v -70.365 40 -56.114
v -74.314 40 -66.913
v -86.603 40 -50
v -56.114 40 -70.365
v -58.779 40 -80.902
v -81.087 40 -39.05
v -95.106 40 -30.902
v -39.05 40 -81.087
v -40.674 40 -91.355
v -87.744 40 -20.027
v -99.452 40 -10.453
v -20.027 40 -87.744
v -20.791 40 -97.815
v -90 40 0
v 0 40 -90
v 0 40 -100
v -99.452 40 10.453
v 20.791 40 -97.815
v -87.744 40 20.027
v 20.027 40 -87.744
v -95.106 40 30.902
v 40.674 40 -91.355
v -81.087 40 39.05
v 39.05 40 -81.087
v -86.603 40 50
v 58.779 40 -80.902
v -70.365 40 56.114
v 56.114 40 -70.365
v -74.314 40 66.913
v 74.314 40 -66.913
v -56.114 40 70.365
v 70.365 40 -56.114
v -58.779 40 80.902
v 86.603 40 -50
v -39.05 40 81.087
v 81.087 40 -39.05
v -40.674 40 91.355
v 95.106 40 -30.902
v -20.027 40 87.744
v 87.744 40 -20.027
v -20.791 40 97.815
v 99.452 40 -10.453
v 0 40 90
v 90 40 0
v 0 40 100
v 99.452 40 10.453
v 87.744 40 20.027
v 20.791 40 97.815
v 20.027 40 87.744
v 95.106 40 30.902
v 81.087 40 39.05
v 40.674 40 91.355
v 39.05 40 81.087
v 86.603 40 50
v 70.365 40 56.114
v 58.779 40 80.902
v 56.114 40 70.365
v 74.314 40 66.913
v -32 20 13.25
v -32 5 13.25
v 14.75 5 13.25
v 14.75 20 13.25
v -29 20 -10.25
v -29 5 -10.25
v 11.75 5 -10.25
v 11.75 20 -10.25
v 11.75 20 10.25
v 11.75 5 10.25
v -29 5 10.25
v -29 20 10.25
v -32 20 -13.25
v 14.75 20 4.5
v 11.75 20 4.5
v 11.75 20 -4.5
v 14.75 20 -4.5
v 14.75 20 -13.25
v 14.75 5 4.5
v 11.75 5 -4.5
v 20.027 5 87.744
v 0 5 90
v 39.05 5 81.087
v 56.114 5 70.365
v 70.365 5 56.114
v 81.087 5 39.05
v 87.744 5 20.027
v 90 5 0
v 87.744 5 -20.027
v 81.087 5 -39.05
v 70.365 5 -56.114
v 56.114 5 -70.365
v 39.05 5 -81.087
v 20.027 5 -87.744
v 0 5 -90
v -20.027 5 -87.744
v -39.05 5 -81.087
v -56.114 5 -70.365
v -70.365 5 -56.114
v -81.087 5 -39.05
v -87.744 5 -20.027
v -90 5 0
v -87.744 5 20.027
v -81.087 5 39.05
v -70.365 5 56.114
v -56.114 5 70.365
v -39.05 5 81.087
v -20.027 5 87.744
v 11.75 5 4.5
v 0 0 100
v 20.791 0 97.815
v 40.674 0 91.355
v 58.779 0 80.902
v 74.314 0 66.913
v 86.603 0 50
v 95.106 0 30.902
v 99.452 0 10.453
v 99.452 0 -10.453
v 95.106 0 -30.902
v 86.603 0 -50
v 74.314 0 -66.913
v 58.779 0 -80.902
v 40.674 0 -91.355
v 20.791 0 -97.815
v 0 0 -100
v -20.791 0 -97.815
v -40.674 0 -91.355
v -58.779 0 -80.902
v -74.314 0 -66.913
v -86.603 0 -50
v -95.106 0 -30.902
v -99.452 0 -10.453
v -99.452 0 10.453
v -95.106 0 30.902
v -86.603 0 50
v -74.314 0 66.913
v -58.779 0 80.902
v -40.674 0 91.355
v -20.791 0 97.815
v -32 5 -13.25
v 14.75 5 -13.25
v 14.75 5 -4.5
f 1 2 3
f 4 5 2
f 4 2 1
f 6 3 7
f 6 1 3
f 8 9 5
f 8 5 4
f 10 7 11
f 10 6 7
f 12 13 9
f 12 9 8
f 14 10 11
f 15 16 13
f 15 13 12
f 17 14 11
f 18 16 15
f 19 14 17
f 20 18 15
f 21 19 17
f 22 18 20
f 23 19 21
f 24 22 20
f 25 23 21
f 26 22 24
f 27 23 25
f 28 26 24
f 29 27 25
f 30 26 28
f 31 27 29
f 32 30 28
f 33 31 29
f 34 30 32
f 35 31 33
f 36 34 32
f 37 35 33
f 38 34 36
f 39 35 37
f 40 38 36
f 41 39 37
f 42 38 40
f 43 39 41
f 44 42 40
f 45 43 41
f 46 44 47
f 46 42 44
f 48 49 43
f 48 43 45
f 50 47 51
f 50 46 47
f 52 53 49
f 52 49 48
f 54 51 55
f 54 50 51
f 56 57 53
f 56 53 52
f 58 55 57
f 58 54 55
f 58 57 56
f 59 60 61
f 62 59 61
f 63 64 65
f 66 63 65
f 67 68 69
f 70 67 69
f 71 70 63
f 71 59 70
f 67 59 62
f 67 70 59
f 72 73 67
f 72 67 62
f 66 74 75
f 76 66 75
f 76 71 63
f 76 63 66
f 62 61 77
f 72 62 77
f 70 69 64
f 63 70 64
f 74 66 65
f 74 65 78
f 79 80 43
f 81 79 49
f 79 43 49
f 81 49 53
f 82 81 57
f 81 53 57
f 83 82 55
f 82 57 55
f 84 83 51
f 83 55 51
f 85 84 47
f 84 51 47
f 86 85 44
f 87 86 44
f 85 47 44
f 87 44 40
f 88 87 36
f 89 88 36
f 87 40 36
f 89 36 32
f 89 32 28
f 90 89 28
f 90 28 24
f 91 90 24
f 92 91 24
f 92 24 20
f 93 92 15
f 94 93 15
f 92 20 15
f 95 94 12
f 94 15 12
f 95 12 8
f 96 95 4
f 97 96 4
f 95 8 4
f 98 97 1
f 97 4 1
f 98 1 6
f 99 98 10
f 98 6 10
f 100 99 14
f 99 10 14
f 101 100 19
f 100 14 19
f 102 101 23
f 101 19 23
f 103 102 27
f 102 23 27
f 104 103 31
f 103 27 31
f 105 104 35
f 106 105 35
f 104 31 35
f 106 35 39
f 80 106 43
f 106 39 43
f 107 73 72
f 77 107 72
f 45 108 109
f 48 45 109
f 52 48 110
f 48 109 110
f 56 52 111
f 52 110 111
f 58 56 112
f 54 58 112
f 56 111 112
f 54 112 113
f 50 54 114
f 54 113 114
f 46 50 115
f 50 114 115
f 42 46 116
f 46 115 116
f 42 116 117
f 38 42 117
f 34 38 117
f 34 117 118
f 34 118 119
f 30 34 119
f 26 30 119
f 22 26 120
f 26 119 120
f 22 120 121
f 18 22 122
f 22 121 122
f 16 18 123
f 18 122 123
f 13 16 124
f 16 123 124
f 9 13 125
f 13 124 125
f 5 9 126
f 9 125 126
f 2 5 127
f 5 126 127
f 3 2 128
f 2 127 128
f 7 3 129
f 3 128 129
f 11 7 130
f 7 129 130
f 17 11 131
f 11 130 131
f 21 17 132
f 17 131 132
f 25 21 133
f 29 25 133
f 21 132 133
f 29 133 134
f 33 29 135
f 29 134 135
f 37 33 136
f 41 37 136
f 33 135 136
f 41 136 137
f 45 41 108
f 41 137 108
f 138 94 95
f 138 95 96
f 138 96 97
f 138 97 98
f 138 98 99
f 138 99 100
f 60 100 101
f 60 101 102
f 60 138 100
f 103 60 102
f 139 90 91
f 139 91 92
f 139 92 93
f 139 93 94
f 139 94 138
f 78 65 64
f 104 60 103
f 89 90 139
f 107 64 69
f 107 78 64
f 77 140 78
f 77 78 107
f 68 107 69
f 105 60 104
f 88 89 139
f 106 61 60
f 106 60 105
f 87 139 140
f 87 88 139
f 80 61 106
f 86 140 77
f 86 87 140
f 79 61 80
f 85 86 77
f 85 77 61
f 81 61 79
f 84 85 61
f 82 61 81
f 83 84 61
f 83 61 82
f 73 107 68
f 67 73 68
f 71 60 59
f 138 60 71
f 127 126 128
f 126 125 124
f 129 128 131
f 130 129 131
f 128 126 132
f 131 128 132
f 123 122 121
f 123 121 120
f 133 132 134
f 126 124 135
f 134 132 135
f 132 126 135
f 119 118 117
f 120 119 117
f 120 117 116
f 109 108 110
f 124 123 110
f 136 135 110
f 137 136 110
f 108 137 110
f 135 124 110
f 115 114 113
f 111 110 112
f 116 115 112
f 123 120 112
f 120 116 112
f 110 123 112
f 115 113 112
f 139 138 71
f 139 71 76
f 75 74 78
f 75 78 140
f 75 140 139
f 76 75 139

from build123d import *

# Parameters (mm, degrees)
SKETCH1_R           = 100
BOSS_EXTRUDE1_DEPTH = 40
SKETCH2_R           = 90
CUT_EXTRUDE1_DEPTH  = 35
SKETCH3_W           = 46.75
SKETCH3_H           = 26.5
BOSS_EXTRUDE2_DEPTH = 15
SKETCH4_W           = 3
SKETCH4_H           = 9
CUT_EXTRUDE2_DEPTH  = 15


with BuildPart() as part:
    # Sketch1 → Boss-Extrude1 (new body)
    with BuildSketch(Plane(origin=(0, 0, 0), x_dir=(1, 0, 0), z_dir=(0, 1, 0))):
        with Locations(Location((0, 0, 0), (0, 0, 270))):
            Circle(SKETCH1_R)
    extrude(amount=BOSS_EXTRUDE1_DEPTH)

    # Sketch2 → Cut-Extrude1 (cut)
    with BuildSketch(Plane(origin=(0, 40, 0), x_dir=(1, 0, 0), z_dir=(0, 1, 0))):
        with Locations(Location((0, 0, 0), (0, 0, 270))):
            Circle(SKETCH2_R)
    extrude(amount=-CUT_EXTRUDE1_DEPTH, mode=Mode.SUBTRACT)

    # Sketch3 → Boss-Extrude2 (add)
    with BuildSketch(Plane(origin=(0, 5, 0), x_dir=(1, 0, 0), z_dir=(0, 1, 0))):
        with Locations((-8.625, 0)):
            Rectangle(SKETCH3_W, SKETCH3_H)
        Polygon((0, 10.25), (11.75, 10.25), (11.75, -10.25), (0, -10.25), (-29, -10.25), (-29, 10.25), align=None, mode=Mode.SUBTRACT)
    extrude(amount=BOSS_EXTRUDE2_DEPTH)

    # Sketch4 → Cut-Extrude2 (cut)
    with BuildSketch(Plane(origin=(0, 20, 0), x_dir=(1, 0, 0), z_dir=(0, 1, 0))):
        with Locations((13.25, 0)):
            Rectangle(SKETCH4_W, SKETCH4_H)
    extrude(amount=-CUT_EXTRUDE2_DEPTH, mode=Mode.SUBTRACT)


solid = part.part
